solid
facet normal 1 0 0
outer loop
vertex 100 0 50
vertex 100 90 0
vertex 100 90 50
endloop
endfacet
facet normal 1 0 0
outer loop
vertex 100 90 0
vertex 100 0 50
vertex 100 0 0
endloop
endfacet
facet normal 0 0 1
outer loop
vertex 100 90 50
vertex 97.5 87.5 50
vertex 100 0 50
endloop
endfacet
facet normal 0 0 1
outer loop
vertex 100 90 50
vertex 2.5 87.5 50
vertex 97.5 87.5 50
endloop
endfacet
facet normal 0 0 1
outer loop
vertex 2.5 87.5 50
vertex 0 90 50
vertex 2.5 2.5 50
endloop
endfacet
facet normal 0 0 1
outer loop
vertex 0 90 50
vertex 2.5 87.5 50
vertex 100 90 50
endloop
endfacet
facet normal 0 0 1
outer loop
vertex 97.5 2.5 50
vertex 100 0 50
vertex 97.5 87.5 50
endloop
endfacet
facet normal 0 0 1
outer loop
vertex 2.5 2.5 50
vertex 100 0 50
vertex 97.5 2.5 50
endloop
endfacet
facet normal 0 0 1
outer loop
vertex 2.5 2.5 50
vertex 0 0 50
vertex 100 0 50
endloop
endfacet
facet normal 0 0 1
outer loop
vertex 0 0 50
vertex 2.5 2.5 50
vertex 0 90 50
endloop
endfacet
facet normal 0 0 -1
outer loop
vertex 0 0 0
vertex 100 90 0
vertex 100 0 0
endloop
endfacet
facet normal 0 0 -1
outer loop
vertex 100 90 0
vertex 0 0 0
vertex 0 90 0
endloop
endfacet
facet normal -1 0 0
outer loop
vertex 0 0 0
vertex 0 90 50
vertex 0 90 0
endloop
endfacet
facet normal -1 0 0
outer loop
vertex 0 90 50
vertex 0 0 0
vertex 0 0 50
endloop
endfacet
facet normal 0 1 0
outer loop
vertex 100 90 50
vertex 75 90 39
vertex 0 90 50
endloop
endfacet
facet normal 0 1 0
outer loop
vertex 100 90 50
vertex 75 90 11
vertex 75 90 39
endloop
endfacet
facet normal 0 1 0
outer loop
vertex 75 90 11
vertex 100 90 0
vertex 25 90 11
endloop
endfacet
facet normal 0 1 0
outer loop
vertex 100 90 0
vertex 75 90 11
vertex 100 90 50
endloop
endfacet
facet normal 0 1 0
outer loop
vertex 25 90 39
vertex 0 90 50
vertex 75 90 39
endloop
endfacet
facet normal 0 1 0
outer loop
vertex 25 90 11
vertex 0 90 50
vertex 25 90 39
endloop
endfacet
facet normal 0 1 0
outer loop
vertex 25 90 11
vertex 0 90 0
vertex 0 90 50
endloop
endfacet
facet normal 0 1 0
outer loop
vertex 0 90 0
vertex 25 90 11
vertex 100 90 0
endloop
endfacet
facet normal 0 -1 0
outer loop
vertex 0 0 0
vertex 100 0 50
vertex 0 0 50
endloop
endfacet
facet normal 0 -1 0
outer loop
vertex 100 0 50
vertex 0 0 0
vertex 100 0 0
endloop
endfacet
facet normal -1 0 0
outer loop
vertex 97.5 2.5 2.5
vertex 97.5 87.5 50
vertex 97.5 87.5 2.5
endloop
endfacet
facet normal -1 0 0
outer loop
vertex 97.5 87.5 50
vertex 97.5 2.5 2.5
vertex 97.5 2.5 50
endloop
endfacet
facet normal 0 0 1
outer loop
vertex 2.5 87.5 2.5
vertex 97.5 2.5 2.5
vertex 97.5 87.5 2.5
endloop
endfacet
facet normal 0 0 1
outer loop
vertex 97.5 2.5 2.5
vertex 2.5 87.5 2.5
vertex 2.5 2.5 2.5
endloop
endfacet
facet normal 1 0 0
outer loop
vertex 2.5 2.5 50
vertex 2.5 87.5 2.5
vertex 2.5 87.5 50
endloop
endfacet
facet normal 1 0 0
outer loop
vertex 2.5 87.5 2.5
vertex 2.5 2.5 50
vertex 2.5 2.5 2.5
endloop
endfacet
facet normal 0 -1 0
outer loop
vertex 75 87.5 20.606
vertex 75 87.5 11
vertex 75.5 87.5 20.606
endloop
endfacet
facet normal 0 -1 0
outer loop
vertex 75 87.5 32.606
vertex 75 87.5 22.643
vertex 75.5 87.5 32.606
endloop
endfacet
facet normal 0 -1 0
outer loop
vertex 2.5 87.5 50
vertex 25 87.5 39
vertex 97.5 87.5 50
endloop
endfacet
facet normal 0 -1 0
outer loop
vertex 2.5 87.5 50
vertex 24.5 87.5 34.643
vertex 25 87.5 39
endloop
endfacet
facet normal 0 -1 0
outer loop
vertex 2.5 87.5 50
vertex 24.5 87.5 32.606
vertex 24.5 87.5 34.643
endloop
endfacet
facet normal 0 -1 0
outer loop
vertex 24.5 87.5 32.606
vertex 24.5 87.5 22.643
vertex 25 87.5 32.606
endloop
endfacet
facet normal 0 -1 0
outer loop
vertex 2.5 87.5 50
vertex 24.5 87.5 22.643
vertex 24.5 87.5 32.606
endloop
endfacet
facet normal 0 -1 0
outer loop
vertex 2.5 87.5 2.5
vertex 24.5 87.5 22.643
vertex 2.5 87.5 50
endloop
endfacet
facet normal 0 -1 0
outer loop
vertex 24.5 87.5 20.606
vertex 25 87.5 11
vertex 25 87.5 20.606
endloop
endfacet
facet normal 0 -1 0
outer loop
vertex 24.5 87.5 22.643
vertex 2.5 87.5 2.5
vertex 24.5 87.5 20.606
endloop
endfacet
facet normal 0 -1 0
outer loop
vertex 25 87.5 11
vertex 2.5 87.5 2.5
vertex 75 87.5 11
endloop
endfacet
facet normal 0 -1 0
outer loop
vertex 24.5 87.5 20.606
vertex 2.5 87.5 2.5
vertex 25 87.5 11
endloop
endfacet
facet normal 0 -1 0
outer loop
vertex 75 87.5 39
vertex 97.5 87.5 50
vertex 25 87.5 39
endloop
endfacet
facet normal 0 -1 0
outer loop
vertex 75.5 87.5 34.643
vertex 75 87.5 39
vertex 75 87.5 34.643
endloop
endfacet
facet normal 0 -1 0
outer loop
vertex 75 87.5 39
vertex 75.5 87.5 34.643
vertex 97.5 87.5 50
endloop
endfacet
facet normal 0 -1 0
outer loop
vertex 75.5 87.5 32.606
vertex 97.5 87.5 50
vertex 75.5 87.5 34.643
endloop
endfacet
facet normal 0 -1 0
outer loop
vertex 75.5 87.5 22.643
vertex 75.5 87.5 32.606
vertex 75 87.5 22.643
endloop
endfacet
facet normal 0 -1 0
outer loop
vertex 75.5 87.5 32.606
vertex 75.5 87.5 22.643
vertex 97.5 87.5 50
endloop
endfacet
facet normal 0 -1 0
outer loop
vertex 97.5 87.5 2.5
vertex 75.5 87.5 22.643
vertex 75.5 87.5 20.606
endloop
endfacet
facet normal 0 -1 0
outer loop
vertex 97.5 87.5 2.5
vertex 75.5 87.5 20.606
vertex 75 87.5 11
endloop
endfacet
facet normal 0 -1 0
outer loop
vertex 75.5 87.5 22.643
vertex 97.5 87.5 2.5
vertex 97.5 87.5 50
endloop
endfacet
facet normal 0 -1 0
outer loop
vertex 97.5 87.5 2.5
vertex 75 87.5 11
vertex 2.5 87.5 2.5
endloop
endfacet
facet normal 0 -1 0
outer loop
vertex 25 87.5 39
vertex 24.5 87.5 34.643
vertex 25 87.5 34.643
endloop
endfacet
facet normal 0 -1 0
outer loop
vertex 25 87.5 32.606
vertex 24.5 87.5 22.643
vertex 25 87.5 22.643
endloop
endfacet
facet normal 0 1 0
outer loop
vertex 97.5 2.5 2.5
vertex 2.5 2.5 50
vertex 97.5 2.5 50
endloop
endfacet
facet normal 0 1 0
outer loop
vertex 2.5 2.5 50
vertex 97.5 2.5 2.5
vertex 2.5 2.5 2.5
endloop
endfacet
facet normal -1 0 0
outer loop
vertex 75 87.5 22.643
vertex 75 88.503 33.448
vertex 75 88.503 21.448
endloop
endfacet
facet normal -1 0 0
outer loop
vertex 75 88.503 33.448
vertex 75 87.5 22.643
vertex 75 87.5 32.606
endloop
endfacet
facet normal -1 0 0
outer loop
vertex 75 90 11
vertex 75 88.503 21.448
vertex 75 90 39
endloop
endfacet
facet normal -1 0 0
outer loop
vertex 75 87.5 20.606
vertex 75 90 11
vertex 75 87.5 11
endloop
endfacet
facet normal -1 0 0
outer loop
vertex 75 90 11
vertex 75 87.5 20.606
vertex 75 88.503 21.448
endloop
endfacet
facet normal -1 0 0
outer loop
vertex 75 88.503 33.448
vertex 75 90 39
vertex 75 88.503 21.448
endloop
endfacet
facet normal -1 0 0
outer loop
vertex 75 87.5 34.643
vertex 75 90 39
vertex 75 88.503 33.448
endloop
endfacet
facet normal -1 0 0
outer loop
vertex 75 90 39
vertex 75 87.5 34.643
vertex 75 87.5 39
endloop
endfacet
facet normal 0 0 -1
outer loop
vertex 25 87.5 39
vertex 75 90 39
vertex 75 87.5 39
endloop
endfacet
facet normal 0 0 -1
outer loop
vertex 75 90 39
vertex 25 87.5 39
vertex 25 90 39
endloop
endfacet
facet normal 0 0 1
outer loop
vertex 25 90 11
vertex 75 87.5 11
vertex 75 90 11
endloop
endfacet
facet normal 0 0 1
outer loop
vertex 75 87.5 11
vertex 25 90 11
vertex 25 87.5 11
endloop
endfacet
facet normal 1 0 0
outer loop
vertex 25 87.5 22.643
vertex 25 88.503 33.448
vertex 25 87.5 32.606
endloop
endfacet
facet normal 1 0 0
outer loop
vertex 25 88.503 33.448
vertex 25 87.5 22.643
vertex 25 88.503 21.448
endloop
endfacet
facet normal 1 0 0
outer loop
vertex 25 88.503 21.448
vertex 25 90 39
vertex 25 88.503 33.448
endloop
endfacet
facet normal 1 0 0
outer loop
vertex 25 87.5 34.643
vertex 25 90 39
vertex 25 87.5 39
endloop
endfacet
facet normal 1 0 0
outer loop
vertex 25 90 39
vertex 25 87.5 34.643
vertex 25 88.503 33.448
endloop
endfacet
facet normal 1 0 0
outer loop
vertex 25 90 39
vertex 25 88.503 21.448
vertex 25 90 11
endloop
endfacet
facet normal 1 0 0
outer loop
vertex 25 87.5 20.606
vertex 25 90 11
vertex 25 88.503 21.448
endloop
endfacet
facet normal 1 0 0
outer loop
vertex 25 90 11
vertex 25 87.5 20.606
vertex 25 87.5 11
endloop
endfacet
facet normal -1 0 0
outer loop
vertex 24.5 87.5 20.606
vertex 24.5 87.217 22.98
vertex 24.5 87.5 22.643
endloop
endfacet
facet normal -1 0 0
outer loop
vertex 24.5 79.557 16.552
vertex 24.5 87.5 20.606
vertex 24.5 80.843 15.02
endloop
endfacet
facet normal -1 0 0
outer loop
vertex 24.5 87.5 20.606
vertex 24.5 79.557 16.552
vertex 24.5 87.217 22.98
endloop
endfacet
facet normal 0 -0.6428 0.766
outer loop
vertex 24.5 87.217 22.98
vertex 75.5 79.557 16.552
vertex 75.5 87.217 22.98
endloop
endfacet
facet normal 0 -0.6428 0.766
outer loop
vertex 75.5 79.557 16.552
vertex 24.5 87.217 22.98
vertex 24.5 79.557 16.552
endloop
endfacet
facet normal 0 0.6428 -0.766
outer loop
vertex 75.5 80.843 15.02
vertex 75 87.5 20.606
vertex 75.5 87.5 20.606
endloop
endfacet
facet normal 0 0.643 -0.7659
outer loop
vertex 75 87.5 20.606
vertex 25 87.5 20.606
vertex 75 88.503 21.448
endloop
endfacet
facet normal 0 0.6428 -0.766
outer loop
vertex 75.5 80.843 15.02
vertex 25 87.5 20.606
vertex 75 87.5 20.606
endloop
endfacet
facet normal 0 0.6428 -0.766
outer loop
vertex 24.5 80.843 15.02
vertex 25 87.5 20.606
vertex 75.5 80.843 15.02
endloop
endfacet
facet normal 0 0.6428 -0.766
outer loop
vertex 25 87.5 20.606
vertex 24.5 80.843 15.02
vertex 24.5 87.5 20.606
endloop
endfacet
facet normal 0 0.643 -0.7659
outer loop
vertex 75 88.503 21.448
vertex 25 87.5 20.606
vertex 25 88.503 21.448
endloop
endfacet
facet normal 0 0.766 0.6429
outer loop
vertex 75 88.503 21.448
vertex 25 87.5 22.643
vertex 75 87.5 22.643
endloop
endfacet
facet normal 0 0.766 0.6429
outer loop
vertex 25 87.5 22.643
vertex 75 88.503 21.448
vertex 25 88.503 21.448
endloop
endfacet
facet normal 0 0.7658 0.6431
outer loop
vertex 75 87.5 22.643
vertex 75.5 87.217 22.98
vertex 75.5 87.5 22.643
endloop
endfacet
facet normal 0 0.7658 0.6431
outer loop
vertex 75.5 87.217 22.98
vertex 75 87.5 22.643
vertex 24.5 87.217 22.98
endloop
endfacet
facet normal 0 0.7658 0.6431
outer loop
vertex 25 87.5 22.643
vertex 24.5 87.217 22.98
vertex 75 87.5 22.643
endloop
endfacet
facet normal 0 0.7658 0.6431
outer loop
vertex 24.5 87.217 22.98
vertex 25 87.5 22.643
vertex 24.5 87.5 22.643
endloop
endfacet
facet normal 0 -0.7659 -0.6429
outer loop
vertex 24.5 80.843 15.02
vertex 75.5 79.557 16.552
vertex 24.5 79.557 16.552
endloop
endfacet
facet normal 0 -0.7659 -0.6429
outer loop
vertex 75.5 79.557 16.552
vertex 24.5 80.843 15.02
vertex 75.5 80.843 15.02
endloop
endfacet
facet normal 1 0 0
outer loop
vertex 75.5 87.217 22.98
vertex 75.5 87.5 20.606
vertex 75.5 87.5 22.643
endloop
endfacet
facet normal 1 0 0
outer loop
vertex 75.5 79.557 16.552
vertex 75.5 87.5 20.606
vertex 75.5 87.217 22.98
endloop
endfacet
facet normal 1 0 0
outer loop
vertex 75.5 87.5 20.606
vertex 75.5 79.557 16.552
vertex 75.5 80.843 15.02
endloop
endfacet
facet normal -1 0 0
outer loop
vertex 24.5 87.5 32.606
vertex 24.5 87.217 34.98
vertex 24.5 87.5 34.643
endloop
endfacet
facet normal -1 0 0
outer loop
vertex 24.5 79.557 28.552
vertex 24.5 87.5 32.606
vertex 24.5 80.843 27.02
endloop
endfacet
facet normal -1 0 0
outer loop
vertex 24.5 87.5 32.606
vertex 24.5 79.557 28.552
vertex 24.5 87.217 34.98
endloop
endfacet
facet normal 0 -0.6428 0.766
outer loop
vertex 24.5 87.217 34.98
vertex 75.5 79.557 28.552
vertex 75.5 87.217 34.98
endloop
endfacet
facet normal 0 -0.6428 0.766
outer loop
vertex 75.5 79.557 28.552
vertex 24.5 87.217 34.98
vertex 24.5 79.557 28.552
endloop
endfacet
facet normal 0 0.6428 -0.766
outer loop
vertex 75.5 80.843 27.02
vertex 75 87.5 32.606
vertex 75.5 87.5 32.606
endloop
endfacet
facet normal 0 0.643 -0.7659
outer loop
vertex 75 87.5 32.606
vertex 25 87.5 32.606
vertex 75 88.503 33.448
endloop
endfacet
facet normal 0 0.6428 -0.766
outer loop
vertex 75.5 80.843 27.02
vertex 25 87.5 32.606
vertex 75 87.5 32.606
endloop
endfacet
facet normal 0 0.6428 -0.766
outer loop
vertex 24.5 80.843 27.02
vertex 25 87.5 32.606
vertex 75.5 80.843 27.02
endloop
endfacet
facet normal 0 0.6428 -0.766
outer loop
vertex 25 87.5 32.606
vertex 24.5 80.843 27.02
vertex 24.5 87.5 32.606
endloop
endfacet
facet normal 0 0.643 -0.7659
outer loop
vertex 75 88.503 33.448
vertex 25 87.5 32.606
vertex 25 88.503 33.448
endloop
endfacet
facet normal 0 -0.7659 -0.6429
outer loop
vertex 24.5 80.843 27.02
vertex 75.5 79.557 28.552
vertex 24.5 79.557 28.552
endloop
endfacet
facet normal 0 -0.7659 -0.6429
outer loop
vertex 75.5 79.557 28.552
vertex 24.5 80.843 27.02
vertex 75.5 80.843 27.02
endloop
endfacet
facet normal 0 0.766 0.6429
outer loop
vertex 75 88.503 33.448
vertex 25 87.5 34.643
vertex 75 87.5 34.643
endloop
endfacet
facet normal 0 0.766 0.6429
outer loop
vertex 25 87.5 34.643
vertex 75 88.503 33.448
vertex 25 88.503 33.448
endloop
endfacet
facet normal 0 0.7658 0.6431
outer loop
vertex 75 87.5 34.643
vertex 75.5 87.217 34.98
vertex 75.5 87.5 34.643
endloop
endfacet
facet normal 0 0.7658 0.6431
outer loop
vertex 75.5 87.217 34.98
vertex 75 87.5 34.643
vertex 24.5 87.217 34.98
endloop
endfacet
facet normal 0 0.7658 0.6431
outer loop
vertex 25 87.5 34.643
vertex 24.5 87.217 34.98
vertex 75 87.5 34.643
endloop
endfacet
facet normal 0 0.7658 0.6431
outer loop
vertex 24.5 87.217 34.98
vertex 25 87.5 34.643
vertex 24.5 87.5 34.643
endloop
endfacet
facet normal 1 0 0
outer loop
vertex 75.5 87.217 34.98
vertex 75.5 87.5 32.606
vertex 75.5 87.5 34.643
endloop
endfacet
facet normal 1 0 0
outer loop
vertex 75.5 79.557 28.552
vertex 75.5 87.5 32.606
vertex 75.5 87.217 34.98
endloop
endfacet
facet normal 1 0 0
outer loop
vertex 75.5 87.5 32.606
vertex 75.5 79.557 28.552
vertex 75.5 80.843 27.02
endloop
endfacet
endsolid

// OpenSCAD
$fn = 32;

// ----------------------------------------------------------------------
// Vent box: louvers enclosure
// ----------------------------------------------------------------------

// --- parameters (mm) ---
box_l = 100;              // box length, X
box_w = 90;               // box width, Y
box_h = 50;               // box height, Z
wall_t = 2.5;             // shell wall thickness
win_l = 50;               // vent window width, X
win_h = 28;               // vent window height, Z
slat_t = 2;               // louver slat thickness
slat_d = 10;              // louver slat depth
slat_a = 40;              // louver slat angle, degrees
slat_pitch = 12;          // louver pitch
slat_yc = 84.03;          // slat centreline Y

win_z0 = (box_h - win_h) / 2;  // window lower edge Z
n_slats = 2;  // louver count
slat_z0 = win_z0 + (win_h - (n_slats - 1) * slat_pitch) / 2;

difference() {
  union() {
    difference() {
      cube([box_l, box_w, box_h]);
  translate([wall_t, wall_t, wall_t])
    cube([box_l - 2 * wall_t, box_w - 2 * wall_t, box_h]);
  translate([(box_l - win_l) / 2, box_w - wall_t - 1, win_z0])
    cube([win_l, wall_t + 2, win_h]);
    }
    for (i = [0 : n_slats - 1])
      translate([box_l / 2, slat_yc, slat_z0 + i * slat_pitch])
        rotate([slat_a, 0, 0])
          cube([win_l + 1, slat_d, slat_t], center = true);
  }
}
